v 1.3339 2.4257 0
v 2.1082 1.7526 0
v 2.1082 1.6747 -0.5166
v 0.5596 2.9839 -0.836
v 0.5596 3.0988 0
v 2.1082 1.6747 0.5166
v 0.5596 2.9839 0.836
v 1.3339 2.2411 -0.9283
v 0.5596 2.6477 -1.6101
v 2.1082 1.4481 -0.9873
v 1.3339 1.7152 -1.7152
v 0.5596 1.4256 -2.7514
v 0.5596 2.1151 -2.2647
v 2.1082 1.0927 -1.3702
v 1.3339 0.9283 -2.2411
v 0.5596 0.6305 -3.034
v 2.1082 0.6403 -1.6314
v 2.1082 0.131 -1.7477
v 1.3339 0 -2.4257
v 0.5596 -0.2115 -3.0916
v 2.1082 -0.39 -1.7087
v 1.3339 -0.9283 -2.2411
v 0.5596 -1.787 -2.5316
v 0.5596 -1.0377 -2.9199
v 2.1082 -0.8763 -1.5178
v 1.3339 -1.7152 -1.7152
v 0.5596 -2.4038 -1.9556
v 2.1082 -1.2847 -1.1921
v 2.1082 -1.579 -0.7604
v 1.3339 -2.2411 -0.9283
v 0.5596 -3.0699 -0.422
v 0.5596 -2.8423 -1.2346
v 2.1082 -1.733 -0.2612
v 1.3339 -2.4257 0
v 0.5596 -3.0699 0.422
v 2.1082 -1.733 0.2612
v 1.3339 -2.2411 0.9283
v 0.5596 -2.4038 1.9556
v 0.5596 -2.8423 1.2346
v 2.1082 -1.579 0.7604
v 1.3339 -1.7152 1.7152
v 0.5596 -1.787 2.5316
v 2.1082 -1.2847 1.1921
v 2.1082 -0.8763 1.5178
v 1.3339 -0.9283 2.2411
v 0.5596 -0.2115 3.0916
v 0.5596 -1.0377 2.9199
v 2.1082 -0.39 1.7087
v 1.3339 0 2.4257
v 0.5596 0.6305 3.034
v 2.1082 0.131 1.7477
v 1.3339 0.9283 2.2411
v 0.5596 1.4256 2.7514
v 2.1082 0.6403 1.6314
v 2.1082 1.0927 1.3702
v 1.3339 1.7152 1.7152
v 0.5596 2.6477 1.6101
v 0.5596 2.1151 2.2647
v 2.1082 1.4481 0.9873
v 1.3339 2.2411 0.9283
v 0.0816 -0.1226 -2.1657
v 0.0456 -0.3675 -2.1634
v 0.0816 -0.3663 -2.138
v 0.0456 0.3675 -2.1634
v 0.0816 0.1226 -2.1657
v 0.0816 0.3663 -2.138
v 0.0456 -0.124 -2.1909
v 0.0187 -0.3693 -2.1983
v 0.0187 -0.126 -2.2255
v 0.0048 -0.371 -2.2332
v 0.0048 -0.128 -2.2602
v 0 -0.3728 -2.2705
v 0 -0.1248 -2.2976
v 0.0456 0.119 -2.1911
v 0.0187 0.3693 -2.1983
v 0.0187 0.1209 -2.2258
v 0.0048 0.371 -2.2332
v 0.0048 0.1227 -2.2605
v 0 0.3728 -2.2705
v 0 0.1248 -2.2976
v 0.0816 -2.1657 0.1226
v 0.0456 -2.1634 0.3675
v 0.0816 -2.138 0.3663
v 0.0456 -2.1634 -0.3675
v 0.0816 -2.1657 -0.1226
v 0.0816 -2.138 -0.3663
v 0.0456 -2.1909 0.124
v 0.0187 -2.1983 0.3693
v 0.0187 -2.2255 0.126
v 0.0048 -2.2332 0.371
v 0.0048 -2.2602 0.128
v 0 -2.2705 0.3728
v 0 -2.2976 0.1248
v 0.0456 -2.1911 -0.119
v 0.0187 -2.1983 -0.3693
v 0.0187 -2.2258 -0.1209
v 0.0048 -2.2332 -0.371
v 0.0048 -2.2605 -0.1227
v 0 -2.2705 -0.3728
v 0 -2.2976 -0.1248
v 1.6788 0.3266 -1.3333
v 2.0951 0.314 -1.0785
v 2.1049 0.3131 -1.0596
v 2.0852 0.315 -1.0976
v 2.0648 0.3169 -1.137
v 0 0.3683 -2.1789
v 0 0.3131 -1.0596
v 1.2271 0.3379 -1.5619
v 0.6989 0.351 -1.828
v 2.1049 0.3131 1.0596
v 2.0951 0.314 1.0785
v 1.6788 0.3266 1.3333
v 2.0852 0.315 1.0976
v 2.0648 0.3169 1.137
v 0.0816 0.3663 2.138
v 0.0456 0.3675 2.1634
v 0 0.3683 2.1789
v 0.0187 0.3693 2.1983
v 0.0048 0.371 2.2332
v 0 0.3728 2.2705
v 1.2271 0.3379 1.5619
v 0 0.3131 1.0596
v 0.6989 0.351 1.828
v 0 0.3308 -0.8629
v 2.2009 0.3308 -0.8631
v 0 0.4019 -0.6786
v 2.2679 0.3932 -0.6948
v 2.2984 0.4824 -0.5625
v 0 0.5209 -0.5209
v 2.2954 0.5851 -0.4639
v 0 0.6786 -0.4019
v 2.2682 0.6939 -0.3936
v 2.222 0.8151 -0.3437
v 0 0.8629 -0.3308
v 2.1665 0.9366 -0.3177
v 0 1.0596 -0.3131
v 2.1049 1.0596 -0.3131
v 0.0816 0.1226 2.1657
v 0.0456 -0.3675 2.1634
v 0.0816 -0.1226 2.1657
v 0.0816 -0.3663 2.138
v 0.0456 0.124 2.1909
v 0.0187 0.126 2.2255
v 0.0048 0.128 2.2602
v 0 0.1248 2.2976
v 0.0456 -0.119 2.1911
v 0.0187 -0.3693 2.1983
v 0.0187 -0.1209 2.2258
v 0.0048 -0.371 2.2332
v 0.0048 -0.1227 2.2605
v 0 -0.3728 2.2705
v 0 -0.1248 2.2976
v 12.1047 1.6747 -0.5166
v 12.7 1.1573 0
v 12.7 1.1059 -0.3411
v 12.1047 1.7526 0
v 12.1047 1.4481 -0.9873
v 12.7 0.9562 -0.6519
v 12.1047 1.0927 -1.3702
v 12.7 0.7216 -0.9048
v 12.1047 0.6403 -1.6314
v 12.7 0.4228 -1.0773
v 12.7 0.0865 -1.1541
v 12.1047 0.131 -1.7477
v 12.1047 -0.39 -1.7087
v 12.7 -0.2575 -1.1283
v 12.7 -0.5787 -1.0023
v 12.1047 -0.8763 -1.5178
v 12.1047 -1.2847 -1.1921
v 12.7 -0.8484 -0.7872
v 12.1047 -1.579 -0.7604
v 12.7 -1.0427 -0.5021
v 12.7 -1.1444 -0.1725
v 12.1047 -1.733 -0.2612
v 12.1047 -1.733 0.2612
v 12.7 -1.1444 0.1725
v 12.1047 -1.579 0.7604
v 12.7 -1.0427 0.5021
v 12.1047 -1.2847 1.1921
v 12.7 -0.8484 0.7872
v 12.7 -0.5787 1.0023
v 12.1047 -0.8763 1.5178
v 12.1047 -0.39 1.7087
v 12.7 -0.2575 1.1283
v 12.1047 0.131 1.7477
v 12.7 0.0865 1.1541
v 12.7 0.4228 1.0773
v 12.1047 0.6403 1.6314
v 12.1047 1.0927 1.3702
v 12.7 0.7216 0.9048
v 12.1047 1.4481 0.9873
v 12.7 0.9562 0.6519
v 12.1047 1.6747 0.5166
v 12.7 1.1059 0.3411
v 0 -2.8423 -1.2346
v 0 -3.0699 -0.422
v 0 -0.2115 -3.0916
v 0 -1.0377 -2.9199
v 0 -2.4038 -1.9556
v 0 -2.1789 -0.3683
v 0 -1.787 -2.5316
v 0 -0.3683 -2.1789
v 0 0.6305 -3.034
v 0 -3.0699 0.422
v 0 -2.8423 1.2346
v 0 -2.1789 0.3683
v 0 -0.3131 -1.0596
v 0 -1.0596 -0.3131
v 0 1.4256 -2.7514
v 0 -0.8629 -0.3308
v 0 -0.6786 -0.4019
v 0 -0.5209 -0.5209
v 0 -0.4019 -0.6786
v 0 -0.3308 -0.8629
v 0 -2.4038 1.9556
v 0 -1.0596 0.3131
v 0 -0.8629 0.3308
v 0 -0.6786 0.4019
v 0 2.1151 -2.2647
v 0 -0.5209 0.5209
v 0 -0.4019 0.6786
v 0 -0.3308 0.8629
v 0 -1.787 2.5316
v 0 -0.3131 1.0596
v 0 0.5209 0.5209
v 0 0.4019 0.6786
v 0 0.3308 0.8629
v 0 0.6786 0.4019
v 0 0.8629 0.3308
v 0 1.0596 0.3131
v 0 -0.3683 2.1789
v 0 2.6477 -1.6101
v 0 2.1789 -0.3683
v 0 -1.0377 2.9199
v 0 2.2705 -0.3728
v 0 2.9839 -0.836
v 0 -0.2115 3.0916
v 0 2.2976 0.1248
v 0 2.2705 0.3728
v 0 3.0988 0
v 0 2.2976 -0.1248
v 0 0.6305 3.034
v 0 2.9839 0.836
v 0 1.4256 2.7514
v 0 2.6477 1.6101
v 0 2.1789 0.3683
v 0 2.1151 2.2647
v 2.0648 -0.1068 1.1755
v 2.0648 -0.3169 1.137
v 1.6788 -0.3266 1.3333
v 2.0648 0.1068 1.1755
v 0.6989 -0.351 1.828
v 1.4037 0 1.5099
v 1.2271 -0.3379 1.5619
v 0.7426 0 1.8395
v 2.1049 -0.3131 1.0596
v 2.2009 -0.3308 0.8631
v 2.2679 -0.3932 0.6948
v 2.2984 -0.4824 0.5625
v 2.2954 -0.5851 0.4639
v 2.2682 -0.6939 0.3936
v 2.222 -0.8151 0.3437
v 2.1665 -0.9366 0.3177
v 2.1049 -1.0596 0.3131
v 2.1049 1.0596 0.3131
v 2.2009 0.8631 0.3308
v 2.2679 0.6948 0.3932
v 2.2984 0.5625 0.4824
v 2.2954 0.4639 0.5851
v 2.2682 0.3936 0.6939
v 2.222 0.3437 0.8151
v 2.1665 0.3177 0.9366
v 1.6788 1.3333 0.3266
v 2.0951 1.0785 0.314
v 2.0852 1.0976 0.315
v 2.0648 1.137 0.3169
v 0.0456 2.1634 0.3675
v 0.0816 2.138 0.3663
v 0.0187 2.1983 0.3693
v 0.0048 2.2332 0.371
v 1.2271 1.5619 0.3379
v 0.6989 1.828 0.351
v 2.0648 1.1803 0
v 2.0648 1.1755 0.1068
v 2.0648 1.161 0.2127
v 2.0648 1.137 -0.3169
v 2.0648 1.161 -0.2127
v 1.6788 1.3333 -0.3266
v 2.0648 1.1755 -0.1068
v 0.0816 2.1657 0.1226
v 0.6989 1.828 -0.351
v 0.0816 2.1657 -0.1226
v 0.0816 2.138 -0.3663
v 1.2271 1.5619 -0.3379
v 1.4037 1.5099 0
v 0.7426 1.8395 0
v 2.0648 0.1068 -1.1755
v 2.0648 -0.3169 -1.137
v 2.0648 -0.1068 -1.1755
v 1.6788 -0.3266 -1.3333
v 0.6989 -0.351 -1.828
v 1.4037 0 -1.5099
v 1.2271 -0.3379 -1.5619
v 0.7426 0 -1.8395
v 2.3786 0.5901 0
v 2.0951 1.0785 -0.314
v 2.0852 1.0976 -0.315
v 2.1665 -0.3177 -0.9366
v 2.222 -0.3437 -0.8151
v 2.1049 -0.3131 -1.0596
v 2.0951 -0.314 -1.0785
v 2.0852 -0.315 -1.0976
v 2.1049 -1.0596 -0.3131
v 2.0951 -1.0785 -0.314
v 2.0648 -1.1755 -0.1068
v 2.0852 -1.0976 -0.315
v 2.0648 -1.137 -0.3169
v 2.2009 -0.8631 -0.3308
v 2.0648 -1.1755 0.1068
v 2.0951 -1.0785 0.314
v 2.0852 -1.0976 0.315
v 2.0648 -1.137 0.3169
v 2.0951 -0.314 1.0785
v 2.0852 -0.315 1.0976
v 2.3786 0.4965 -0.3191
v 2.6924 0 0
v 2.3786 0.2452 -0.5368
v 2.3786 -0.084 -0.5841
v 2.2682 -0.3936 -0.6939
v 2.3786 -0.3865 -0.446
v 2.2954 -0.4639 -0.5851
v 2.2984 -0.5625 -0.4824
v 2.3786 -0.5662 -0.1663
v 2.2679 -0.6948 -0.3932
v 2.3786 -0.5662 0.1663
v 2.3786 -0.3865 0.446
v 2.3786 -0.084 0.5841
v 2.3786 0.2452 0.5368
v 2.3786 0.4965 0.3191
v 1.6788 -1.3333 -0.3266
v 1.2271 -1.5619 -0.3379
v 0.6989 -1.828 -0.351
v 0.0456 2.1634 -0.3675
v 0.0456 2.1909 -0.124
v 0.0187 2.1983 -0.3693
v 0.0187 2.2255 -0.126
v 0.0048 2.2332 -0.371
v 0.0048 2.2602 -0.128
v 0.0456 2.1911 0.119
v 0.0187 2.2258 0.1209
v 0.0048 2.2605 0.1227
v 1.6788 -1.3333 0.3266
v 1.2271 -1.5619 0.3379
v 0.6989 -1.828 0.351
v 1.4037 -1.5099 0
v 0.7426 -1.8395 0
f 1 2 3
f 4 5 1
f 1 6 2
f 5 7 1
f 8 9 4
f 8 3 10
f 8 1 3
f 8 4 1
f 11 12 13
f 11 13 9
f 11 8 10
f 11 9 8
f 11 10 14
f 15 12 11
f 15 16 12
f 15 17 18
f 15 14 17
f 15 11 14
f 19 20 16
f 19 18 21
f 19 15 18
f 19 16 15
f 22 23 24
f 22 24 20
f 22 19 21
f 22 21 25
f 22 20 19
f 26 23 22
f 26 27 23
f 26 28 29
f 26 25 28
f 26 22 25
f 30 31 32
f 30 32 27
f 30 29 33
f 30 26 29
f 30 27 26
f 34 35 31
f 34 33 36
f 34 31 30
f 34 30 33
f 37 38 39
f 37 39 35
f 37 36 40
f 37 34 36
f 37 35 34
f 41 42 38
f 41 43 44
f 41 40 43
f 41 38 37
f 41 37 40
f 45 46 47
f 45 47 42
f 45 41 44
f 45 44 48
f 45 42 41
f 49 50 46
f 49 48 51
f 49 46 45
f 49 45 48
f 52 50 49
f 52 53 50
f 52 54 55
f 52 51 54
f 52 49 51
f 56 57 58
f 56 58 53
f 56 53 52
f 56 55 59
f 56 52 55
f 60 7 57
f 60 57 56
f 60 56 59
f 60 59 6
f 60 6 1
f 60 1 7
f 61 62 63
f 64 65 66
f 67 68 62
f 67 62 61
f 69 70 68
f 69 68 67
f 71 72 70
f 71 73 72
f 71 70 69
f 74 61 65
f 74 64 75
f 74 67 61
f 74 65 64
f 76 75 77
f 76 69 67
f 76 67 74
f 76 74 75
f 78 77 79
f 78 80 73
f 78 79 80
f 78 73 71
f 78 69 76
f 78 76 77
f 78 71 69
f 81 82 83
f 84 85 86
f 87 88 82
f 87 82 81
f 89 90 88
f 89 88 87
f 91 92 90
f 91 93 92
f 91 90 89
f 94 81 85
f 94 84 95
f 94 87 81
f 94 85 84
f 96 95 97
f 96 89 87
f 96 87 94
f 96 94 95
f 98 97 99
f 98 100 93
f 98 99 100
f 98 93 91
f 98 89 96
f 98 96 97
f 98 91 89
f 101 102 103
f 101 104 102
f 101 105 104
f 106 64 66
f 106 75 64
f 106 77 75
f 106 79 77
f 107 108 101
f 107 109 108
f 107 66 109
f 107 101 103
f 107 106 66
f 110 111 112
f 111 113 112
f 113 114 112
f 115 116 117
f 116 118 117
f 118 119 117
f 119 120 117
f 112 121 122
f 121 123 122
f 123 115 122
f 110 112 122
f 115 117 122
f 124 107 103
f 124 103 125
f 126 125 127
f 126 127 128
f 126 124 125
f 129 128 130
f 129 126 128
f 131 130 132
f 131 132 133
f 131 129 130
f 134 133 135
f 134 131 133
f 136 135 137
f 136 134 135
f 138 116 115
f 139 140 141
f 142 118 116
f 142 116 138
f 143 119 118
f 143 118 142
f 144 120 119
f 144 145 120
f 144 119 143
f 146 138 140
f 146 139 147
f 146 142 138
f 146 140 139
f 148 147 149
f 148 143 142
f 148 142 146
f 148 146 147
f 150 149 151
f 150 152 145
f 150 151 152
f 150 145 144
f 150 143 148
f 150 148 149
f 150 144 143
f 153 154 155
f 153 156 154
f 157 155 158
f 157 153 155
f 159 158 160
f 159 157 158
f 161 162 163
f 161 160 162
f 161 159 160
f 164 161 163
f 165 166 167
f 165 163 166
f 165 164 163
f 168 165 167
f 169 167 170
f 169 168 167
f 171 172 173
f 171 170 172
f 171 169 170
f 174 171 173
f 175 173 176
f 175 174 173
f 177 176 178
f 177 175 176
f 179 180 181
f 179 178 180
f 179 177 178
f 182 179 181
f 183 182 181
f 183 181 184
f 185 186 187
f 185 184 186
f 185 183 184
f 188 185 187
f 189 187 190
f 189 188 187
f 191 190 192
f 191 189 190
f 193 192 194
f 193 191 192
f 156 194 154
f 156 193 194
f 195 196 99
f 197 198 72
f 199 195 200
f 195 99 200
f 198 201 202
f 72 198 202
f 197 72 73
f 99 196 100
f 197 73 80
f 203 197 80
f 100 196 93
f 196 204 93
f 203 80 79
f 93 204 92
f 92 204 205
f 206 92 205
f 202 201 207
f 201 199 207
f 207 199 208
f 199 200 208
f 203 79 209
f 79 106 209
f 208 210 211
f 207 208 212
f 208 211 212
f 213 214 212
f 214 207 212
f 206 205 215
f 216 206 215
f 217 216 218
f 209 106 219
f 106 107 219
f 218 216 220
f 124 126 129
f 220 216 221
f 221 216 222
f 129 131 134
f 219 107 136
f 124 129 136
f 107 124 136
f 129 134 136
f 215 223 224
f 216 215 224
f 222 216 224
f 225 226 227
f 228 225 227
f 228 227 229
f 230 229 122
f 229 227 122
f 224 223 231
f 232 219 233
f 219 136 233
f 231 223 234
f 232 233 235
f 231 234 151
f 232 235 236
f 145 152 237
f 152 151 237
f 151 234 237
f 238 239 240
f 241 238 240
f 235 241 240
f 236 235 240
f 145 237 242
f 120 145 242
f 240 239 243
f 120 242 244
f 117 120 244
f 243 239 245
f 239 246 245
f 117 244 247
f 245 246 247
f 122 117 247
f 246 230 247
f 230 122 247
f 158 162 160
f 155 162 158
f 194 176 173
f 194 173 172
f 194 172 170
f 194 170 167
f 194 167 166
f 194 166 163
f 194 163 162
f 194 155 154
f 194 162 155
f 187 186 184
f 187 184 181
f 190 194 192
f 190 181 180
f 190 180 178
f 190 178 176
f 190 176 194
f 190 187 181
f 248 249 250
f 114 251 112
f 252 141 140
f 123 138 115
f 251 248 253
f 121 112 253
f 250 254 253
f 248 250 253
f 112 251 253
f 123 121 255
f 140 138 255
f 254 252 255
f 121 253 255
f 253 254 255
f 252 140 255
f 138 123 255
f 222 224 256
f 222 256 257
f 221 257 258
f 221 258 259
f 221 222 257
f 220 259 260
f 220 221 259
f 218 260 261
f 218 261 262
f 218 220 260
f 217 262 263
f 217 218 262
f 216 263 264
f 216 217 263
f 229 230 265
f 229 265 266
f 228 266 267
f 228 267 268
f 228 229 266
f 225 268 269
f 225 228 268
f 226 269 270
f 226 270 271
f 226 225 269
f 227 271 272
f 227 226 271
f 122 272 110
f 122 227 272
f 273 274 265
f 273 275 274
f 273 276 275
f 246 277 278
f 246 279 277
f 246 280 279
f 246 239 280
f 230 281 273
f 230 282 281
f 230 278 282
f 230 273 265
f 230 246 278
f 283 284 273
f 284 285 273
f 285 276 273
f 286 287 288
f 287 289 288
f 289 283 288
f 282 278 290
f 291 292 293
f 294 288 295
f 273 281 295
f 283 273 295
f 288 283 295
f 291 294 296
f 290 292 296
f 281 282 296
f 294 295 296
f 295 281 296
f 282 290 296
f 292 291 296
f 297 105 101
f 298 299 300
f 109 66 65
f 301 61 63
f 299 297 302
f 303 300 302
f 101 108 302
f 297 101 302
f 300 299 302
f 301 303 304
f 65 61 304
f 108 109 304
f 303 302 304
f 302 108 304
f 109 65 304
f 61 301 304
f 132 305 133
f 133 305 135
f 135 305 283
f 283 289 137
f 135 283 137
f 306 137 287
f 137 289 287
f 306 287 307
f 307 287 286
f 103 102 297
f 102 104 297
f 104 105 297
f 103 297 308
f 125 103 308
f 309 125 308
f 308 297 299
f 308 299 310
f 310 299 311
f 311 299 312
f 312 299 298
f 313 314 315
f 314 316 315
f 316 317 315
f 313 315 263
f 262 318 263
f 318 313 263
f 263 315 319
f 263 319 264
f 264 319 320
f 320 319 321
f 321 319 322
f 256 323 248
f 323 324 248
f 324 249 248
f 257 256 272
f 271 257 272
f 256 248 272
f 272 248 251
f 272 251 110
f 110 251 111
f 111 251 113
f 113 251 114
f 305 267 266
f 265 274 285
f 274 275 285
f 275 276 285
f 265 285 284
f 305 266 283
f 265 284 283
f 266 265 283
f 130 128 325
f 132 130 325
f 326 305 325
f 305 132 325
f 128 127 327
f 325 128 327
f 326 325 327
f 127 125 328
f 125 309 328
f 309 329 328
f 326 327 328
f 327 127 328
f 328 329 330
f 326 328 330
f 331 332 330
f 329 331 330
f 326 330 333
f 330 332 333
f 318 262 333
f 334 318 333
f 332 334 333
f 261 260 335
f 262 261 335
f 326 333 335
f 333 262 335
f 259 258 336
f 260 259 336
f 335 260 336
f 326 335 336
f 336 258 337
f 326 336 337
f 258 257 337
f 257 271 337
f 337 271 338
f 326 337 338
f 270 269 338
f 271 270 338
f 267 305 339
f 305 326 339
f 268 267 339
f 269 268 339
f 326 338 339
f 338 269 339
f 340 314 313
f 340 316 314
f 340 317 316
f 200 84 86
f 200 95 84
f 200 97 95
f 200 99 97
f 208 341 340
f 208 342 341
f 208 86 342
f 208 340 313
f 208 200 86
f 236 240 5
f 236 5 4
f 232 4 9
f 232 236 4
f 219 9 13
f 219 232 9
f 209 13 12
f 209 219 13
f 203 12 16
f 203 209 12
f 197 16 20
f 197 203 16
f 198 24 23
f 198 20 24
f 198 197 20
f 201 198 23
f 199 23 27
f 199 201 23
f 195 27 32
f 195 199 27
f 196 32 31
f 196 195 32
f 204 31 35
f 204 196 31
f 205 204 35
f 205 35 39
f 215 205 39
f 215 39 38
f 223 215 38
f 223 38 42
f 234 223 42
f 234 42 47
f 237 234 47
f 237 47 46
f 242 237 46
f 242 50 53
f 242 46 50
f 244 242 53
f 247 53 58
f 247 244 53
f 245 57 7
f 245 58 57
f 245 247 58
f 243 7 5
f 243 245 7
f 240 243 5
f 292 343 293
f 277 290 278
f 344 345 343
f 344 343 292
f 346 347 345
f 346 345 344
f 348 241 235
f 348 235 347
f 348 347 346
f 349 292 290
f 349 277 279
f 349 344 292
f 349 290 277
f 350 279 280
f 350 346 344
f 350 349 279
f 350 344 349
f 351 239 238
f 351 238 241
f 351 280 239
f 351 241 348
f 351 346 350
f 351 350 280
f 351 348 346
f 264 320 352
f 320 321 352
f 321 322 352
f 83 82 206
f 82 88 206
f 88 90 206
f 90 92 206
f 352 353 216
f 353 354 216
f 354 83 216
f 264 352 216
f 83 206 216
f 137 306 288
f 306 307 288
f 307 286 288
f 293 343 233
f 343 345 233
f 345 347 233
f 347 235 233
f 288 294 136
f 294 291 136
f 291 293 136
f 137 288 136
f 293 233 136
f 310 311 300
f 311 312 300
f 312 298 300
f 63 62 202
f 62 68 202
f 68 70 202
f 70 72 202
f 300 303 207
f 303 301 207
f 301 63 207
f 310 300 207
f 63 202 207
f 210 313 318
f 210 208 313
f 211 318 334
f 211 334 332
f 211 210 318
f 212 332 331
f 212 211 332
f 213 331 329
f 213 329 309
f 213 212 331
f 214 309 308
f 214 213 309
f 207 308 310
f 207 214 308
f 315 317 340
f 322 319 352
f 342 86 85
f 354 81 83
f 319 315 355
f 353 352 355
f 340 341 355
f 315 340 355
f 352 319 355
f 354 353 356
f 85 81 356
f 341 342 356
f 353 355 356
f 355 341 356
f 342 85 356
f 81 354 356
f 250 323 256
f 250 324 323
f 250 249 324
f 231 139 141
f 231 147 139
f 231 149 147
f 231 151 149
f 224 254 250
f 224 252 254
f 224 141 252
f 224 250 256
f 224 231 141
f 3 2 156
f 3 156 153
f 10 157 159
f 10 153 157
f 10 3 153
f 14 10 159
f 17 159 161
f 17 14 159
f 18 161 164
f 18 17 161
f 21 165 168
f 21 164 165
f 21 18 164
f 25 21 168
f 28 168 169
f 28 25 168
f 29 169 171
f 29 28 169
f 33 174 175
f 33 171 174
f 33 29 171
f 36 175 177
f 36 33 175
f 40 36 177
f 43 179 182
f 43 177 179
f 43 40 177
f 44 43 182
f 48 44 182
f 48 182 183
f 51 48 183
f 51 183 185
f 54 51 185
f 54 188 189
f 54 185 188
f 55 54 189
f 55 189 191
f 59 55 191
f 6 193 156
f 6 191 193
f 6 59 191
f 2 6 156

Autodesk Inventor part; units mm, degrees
ref_plane "YZ Plane" through (0, 0, 0) normal (1, 0, 0) x (0, 1, 0)
ref_plane "XZ Plane" through (0, 0, 0) normal (0, 1, 0) x (-1, 0, 0)
sketch "Sketch1" plane through (0, 0, 0) normal (0, 0, 1) x (1, 0, 0)
  line L0 (2.6924, 0) -> (12.7, 0)
  line L1 (12.7, 0) -> (12.7, 1.7526)
  line L2 (12.7, 1.7526) -> (2.1082, 1.7526)
  line L3 (0.5596, 3.0988) -> (0, 3.0988)
  line L4 (-2.54, 0) -> (15.24, 0) projected
  line L5 (0, -0.6198) -> (0, 3.7186) projected
  line L6 (0, 2.2098) -> (2.0648, 1.1803)
  line L7 (2.0648, 1.1803) -> (2.6924, 0)
  line L8 (2.1082, 1.7526) -> (0.5596, 3.0988)
  line L9 (0, 3.0988) -> (0, 2.2098)
  dimension "d2" = 3.5052
  dimension "d3" = 6.1976
  dimension "d4" = 2.6924
  dimension "d5" = 4.4196
  dimension "d6" = 26.5
  dimension "d7" = 62
  dimension "d13" = 41
  dimension "d14" = 2.1082
  dimension "d15" = 12.7
revolve "Body" add sketch "Sketch1" angle 360 about axis through (2.6924, 0, 0) along (1, 0, 0) contours L7 L6 L5 L3 L8 L2 L1 L0
sketch "Sketch2" plane through (0, 0, 0) normal (-1, 0, 0) x (0, 0, 1)
  line L0 (0, -4.3383) -> (0, 4.3383) projected
  line L1 (-4.3383, 0) -> (4.3383, 0) projected
  line L2 (0, 2.2098) -> (0, 0) construction
  line L3 (0, 0) -> (2.2098, 0) construction
  arc A0 (0.7366, 0) -> (0, 0.7366) centre (0, 0) ccw
  line L4 (0, 0) -> (0.7947, 0.7947) construction
  arc A1 (1.1049, 0) -> (0, 1.1049) centre (0, 0) ccw construction
  line L5 (0.3683, 2.1789) -> (0.3131, 1.0596)
  line L6 (2.1789, 0.3683) -> (1.0596, 0.3131)
  arc A2 (0.3131, 1.0596) -> (1.0596, 0.3131) centre (1.0245, 1.0245) ccw
  arc A3 (2.2098, 0) -> (2.1789, 0.3683) centre (0, 0) ccw
  arc A4 (0.3683, 2.1789) -> (0, 2.2098) centre (0, 0) ccw
  arc A5 (2.1789, 0.3683) -> (0.3683, 2.1789) centre (0, 0) ccw
  line L7 (0.3683, -2.1789) -> (0.3131, -1.0596)
  line L8 (2.1789, -0.3683) -> (1.0596, -0.3131)
  arc A6 (1.0596, -0.3131) -> (0.3131, -1.0596) centre (1.0245, -1.0245) ccw
  arc A7 (2.1789, -0.3683) -> (2.2098, 0) centre (0, 0) ccw
  arc A8 (0, -2.2098) -> (0.3683, -2.1789) centre (0, 0) ccw
  arc A9 (0.3683, -2.1789) -> (2.1789, -0.3683) centre (0, 0) ccw
  line L9 (-0.3683, 2.1789) -> (-0.3131, 1.0596)
  line L10 (-2.1789, 0.3683) -> (-1.0596, 0.3131)
  arc A10 (-1.0596, 0.3131) -> (-0.3131, 1.0596) centre (-1.0245, 1.0245) ccw
  arc A11 (-2.1789, 0.3683) -> (-2.2098, 0) centre (0, 0) ccw
  arc A12 (0, 2.2098) -> (-0.3683, 2.1789) centre (0, 0) ccw
  arc A13 (-0.3683, 2.1789) -> (-2.1789, 0.3683) centre (0, 0) ccw
  arc A14 (-2.1789, -0.3683) -> (-0.3683, -2.1789) centre (0, 0) ccw
  arc A15 (-0.3683, -2.1789) -> (0, -2.2098) centre (0, 0) ccw
  arc A16 (-2.2098, 0) -> (-2.1789, -0.3683) centre (0, 0) ccw
  line L11 (-2.1789, -0.3683) -> (-1.0596, -0.3131)
  arc A17 (-0.3131, -1.0596) -> (-1.0596, -0.3131) centre (-1.0245, -1.0245) ccw
  line L12 (-0.3683, -2.1789) -> (-0.3131, -1.0596)
  dimension "d18" = 45
  dimension "d19" = 1.4732
  dimension "d20" = 2.2098
  dimension "d21" = 4.4196
  dimension "d22" = 0.3683
extrude "Slot" add sketch "Sketch2" against normal up to next contours A2 L5 A5 L6 | L9 A10 L10 A13 | L7 A6 L8 A9 | A14 L11 A17 L12
fillet "Fillet1" radius 0.1473 4 edges at (0, 2.2098, 0) (0, 0, 2.2098) (0, -2.2098, 0) (0, 0, -2.2098)
thread "Thread" size "6-32 UNC" class "2A" standard "ANSI Unified Screw Threads" length 8.6074
chamfer "Chamfer1" distance 0.5953 distance2 0.5953 1 edges at (12.7, -1.7526, 0) measured on face at (12.7, -0.023, 0.3874)
ref_plane "Work Plane2" through (2.032, 0, 0) normal (0, 1, 0) x (1, 0, 0)
equation "\"d2\" = GD"
equation "\"d3\" = KOD"
equation "\"d4\" = INTI"
equation "\"d5\" = SDM"
equation "\"d13\" = 0.5 * SEWI"
equation "\"d14\" = KOH"
equation "\"d15\" = NLG"
equation "\"d19\" = 0.333333 * SDM"
equation "\"d20\" = 0.5 * SDM"
equation "\"d21\" = SDM"
equation "\"d22\" = 0.5 * SBR"
equation "\"d45\" = INTI"
equation "\"d25\" = 0.2 * SBR"
equation "\"d9\" = GEL"
equation "\"d11\" = -0.5 * SPD + 0.5 * GD"
equation "\"d12\" = GUL"
equation "\"GD\" = NND"
equation "\"NLG\" = 12.7"
equation "\"GEL\" = 8.60742"
equation "\"KOD\" = 6.1976"
equation "\"KOH\" = 2.1082"
equation "\"SDM\" = 4.4196"
equation "\"INTI\" = 2.6924"
equation "\"SBR\" = 0.7366"
equation "\"GUL\" = 0.75 * GAL"
equation "\"SPD\" = 2.31458"
equation "\"SEWI\" = 82deg"
equation "\"d0\" = NLG"
equation "\"d1\" = KOH"
equation "\"d17\" = SDM"
equation "\"TOA\" = 30deg"
equation "\"THREADDIA\" = 3.5052"
equation "\"BDM\" = NND"
equation "\"NND\" = 3.5052"
equation "\"GAL\" = 0.79375"
equation "\"GD1\" = SPD"
properties part number "ANSI B18.6.3 - 6-32 x 1/2, CRFCHMSTII(5)" material "Steel, Mild"
